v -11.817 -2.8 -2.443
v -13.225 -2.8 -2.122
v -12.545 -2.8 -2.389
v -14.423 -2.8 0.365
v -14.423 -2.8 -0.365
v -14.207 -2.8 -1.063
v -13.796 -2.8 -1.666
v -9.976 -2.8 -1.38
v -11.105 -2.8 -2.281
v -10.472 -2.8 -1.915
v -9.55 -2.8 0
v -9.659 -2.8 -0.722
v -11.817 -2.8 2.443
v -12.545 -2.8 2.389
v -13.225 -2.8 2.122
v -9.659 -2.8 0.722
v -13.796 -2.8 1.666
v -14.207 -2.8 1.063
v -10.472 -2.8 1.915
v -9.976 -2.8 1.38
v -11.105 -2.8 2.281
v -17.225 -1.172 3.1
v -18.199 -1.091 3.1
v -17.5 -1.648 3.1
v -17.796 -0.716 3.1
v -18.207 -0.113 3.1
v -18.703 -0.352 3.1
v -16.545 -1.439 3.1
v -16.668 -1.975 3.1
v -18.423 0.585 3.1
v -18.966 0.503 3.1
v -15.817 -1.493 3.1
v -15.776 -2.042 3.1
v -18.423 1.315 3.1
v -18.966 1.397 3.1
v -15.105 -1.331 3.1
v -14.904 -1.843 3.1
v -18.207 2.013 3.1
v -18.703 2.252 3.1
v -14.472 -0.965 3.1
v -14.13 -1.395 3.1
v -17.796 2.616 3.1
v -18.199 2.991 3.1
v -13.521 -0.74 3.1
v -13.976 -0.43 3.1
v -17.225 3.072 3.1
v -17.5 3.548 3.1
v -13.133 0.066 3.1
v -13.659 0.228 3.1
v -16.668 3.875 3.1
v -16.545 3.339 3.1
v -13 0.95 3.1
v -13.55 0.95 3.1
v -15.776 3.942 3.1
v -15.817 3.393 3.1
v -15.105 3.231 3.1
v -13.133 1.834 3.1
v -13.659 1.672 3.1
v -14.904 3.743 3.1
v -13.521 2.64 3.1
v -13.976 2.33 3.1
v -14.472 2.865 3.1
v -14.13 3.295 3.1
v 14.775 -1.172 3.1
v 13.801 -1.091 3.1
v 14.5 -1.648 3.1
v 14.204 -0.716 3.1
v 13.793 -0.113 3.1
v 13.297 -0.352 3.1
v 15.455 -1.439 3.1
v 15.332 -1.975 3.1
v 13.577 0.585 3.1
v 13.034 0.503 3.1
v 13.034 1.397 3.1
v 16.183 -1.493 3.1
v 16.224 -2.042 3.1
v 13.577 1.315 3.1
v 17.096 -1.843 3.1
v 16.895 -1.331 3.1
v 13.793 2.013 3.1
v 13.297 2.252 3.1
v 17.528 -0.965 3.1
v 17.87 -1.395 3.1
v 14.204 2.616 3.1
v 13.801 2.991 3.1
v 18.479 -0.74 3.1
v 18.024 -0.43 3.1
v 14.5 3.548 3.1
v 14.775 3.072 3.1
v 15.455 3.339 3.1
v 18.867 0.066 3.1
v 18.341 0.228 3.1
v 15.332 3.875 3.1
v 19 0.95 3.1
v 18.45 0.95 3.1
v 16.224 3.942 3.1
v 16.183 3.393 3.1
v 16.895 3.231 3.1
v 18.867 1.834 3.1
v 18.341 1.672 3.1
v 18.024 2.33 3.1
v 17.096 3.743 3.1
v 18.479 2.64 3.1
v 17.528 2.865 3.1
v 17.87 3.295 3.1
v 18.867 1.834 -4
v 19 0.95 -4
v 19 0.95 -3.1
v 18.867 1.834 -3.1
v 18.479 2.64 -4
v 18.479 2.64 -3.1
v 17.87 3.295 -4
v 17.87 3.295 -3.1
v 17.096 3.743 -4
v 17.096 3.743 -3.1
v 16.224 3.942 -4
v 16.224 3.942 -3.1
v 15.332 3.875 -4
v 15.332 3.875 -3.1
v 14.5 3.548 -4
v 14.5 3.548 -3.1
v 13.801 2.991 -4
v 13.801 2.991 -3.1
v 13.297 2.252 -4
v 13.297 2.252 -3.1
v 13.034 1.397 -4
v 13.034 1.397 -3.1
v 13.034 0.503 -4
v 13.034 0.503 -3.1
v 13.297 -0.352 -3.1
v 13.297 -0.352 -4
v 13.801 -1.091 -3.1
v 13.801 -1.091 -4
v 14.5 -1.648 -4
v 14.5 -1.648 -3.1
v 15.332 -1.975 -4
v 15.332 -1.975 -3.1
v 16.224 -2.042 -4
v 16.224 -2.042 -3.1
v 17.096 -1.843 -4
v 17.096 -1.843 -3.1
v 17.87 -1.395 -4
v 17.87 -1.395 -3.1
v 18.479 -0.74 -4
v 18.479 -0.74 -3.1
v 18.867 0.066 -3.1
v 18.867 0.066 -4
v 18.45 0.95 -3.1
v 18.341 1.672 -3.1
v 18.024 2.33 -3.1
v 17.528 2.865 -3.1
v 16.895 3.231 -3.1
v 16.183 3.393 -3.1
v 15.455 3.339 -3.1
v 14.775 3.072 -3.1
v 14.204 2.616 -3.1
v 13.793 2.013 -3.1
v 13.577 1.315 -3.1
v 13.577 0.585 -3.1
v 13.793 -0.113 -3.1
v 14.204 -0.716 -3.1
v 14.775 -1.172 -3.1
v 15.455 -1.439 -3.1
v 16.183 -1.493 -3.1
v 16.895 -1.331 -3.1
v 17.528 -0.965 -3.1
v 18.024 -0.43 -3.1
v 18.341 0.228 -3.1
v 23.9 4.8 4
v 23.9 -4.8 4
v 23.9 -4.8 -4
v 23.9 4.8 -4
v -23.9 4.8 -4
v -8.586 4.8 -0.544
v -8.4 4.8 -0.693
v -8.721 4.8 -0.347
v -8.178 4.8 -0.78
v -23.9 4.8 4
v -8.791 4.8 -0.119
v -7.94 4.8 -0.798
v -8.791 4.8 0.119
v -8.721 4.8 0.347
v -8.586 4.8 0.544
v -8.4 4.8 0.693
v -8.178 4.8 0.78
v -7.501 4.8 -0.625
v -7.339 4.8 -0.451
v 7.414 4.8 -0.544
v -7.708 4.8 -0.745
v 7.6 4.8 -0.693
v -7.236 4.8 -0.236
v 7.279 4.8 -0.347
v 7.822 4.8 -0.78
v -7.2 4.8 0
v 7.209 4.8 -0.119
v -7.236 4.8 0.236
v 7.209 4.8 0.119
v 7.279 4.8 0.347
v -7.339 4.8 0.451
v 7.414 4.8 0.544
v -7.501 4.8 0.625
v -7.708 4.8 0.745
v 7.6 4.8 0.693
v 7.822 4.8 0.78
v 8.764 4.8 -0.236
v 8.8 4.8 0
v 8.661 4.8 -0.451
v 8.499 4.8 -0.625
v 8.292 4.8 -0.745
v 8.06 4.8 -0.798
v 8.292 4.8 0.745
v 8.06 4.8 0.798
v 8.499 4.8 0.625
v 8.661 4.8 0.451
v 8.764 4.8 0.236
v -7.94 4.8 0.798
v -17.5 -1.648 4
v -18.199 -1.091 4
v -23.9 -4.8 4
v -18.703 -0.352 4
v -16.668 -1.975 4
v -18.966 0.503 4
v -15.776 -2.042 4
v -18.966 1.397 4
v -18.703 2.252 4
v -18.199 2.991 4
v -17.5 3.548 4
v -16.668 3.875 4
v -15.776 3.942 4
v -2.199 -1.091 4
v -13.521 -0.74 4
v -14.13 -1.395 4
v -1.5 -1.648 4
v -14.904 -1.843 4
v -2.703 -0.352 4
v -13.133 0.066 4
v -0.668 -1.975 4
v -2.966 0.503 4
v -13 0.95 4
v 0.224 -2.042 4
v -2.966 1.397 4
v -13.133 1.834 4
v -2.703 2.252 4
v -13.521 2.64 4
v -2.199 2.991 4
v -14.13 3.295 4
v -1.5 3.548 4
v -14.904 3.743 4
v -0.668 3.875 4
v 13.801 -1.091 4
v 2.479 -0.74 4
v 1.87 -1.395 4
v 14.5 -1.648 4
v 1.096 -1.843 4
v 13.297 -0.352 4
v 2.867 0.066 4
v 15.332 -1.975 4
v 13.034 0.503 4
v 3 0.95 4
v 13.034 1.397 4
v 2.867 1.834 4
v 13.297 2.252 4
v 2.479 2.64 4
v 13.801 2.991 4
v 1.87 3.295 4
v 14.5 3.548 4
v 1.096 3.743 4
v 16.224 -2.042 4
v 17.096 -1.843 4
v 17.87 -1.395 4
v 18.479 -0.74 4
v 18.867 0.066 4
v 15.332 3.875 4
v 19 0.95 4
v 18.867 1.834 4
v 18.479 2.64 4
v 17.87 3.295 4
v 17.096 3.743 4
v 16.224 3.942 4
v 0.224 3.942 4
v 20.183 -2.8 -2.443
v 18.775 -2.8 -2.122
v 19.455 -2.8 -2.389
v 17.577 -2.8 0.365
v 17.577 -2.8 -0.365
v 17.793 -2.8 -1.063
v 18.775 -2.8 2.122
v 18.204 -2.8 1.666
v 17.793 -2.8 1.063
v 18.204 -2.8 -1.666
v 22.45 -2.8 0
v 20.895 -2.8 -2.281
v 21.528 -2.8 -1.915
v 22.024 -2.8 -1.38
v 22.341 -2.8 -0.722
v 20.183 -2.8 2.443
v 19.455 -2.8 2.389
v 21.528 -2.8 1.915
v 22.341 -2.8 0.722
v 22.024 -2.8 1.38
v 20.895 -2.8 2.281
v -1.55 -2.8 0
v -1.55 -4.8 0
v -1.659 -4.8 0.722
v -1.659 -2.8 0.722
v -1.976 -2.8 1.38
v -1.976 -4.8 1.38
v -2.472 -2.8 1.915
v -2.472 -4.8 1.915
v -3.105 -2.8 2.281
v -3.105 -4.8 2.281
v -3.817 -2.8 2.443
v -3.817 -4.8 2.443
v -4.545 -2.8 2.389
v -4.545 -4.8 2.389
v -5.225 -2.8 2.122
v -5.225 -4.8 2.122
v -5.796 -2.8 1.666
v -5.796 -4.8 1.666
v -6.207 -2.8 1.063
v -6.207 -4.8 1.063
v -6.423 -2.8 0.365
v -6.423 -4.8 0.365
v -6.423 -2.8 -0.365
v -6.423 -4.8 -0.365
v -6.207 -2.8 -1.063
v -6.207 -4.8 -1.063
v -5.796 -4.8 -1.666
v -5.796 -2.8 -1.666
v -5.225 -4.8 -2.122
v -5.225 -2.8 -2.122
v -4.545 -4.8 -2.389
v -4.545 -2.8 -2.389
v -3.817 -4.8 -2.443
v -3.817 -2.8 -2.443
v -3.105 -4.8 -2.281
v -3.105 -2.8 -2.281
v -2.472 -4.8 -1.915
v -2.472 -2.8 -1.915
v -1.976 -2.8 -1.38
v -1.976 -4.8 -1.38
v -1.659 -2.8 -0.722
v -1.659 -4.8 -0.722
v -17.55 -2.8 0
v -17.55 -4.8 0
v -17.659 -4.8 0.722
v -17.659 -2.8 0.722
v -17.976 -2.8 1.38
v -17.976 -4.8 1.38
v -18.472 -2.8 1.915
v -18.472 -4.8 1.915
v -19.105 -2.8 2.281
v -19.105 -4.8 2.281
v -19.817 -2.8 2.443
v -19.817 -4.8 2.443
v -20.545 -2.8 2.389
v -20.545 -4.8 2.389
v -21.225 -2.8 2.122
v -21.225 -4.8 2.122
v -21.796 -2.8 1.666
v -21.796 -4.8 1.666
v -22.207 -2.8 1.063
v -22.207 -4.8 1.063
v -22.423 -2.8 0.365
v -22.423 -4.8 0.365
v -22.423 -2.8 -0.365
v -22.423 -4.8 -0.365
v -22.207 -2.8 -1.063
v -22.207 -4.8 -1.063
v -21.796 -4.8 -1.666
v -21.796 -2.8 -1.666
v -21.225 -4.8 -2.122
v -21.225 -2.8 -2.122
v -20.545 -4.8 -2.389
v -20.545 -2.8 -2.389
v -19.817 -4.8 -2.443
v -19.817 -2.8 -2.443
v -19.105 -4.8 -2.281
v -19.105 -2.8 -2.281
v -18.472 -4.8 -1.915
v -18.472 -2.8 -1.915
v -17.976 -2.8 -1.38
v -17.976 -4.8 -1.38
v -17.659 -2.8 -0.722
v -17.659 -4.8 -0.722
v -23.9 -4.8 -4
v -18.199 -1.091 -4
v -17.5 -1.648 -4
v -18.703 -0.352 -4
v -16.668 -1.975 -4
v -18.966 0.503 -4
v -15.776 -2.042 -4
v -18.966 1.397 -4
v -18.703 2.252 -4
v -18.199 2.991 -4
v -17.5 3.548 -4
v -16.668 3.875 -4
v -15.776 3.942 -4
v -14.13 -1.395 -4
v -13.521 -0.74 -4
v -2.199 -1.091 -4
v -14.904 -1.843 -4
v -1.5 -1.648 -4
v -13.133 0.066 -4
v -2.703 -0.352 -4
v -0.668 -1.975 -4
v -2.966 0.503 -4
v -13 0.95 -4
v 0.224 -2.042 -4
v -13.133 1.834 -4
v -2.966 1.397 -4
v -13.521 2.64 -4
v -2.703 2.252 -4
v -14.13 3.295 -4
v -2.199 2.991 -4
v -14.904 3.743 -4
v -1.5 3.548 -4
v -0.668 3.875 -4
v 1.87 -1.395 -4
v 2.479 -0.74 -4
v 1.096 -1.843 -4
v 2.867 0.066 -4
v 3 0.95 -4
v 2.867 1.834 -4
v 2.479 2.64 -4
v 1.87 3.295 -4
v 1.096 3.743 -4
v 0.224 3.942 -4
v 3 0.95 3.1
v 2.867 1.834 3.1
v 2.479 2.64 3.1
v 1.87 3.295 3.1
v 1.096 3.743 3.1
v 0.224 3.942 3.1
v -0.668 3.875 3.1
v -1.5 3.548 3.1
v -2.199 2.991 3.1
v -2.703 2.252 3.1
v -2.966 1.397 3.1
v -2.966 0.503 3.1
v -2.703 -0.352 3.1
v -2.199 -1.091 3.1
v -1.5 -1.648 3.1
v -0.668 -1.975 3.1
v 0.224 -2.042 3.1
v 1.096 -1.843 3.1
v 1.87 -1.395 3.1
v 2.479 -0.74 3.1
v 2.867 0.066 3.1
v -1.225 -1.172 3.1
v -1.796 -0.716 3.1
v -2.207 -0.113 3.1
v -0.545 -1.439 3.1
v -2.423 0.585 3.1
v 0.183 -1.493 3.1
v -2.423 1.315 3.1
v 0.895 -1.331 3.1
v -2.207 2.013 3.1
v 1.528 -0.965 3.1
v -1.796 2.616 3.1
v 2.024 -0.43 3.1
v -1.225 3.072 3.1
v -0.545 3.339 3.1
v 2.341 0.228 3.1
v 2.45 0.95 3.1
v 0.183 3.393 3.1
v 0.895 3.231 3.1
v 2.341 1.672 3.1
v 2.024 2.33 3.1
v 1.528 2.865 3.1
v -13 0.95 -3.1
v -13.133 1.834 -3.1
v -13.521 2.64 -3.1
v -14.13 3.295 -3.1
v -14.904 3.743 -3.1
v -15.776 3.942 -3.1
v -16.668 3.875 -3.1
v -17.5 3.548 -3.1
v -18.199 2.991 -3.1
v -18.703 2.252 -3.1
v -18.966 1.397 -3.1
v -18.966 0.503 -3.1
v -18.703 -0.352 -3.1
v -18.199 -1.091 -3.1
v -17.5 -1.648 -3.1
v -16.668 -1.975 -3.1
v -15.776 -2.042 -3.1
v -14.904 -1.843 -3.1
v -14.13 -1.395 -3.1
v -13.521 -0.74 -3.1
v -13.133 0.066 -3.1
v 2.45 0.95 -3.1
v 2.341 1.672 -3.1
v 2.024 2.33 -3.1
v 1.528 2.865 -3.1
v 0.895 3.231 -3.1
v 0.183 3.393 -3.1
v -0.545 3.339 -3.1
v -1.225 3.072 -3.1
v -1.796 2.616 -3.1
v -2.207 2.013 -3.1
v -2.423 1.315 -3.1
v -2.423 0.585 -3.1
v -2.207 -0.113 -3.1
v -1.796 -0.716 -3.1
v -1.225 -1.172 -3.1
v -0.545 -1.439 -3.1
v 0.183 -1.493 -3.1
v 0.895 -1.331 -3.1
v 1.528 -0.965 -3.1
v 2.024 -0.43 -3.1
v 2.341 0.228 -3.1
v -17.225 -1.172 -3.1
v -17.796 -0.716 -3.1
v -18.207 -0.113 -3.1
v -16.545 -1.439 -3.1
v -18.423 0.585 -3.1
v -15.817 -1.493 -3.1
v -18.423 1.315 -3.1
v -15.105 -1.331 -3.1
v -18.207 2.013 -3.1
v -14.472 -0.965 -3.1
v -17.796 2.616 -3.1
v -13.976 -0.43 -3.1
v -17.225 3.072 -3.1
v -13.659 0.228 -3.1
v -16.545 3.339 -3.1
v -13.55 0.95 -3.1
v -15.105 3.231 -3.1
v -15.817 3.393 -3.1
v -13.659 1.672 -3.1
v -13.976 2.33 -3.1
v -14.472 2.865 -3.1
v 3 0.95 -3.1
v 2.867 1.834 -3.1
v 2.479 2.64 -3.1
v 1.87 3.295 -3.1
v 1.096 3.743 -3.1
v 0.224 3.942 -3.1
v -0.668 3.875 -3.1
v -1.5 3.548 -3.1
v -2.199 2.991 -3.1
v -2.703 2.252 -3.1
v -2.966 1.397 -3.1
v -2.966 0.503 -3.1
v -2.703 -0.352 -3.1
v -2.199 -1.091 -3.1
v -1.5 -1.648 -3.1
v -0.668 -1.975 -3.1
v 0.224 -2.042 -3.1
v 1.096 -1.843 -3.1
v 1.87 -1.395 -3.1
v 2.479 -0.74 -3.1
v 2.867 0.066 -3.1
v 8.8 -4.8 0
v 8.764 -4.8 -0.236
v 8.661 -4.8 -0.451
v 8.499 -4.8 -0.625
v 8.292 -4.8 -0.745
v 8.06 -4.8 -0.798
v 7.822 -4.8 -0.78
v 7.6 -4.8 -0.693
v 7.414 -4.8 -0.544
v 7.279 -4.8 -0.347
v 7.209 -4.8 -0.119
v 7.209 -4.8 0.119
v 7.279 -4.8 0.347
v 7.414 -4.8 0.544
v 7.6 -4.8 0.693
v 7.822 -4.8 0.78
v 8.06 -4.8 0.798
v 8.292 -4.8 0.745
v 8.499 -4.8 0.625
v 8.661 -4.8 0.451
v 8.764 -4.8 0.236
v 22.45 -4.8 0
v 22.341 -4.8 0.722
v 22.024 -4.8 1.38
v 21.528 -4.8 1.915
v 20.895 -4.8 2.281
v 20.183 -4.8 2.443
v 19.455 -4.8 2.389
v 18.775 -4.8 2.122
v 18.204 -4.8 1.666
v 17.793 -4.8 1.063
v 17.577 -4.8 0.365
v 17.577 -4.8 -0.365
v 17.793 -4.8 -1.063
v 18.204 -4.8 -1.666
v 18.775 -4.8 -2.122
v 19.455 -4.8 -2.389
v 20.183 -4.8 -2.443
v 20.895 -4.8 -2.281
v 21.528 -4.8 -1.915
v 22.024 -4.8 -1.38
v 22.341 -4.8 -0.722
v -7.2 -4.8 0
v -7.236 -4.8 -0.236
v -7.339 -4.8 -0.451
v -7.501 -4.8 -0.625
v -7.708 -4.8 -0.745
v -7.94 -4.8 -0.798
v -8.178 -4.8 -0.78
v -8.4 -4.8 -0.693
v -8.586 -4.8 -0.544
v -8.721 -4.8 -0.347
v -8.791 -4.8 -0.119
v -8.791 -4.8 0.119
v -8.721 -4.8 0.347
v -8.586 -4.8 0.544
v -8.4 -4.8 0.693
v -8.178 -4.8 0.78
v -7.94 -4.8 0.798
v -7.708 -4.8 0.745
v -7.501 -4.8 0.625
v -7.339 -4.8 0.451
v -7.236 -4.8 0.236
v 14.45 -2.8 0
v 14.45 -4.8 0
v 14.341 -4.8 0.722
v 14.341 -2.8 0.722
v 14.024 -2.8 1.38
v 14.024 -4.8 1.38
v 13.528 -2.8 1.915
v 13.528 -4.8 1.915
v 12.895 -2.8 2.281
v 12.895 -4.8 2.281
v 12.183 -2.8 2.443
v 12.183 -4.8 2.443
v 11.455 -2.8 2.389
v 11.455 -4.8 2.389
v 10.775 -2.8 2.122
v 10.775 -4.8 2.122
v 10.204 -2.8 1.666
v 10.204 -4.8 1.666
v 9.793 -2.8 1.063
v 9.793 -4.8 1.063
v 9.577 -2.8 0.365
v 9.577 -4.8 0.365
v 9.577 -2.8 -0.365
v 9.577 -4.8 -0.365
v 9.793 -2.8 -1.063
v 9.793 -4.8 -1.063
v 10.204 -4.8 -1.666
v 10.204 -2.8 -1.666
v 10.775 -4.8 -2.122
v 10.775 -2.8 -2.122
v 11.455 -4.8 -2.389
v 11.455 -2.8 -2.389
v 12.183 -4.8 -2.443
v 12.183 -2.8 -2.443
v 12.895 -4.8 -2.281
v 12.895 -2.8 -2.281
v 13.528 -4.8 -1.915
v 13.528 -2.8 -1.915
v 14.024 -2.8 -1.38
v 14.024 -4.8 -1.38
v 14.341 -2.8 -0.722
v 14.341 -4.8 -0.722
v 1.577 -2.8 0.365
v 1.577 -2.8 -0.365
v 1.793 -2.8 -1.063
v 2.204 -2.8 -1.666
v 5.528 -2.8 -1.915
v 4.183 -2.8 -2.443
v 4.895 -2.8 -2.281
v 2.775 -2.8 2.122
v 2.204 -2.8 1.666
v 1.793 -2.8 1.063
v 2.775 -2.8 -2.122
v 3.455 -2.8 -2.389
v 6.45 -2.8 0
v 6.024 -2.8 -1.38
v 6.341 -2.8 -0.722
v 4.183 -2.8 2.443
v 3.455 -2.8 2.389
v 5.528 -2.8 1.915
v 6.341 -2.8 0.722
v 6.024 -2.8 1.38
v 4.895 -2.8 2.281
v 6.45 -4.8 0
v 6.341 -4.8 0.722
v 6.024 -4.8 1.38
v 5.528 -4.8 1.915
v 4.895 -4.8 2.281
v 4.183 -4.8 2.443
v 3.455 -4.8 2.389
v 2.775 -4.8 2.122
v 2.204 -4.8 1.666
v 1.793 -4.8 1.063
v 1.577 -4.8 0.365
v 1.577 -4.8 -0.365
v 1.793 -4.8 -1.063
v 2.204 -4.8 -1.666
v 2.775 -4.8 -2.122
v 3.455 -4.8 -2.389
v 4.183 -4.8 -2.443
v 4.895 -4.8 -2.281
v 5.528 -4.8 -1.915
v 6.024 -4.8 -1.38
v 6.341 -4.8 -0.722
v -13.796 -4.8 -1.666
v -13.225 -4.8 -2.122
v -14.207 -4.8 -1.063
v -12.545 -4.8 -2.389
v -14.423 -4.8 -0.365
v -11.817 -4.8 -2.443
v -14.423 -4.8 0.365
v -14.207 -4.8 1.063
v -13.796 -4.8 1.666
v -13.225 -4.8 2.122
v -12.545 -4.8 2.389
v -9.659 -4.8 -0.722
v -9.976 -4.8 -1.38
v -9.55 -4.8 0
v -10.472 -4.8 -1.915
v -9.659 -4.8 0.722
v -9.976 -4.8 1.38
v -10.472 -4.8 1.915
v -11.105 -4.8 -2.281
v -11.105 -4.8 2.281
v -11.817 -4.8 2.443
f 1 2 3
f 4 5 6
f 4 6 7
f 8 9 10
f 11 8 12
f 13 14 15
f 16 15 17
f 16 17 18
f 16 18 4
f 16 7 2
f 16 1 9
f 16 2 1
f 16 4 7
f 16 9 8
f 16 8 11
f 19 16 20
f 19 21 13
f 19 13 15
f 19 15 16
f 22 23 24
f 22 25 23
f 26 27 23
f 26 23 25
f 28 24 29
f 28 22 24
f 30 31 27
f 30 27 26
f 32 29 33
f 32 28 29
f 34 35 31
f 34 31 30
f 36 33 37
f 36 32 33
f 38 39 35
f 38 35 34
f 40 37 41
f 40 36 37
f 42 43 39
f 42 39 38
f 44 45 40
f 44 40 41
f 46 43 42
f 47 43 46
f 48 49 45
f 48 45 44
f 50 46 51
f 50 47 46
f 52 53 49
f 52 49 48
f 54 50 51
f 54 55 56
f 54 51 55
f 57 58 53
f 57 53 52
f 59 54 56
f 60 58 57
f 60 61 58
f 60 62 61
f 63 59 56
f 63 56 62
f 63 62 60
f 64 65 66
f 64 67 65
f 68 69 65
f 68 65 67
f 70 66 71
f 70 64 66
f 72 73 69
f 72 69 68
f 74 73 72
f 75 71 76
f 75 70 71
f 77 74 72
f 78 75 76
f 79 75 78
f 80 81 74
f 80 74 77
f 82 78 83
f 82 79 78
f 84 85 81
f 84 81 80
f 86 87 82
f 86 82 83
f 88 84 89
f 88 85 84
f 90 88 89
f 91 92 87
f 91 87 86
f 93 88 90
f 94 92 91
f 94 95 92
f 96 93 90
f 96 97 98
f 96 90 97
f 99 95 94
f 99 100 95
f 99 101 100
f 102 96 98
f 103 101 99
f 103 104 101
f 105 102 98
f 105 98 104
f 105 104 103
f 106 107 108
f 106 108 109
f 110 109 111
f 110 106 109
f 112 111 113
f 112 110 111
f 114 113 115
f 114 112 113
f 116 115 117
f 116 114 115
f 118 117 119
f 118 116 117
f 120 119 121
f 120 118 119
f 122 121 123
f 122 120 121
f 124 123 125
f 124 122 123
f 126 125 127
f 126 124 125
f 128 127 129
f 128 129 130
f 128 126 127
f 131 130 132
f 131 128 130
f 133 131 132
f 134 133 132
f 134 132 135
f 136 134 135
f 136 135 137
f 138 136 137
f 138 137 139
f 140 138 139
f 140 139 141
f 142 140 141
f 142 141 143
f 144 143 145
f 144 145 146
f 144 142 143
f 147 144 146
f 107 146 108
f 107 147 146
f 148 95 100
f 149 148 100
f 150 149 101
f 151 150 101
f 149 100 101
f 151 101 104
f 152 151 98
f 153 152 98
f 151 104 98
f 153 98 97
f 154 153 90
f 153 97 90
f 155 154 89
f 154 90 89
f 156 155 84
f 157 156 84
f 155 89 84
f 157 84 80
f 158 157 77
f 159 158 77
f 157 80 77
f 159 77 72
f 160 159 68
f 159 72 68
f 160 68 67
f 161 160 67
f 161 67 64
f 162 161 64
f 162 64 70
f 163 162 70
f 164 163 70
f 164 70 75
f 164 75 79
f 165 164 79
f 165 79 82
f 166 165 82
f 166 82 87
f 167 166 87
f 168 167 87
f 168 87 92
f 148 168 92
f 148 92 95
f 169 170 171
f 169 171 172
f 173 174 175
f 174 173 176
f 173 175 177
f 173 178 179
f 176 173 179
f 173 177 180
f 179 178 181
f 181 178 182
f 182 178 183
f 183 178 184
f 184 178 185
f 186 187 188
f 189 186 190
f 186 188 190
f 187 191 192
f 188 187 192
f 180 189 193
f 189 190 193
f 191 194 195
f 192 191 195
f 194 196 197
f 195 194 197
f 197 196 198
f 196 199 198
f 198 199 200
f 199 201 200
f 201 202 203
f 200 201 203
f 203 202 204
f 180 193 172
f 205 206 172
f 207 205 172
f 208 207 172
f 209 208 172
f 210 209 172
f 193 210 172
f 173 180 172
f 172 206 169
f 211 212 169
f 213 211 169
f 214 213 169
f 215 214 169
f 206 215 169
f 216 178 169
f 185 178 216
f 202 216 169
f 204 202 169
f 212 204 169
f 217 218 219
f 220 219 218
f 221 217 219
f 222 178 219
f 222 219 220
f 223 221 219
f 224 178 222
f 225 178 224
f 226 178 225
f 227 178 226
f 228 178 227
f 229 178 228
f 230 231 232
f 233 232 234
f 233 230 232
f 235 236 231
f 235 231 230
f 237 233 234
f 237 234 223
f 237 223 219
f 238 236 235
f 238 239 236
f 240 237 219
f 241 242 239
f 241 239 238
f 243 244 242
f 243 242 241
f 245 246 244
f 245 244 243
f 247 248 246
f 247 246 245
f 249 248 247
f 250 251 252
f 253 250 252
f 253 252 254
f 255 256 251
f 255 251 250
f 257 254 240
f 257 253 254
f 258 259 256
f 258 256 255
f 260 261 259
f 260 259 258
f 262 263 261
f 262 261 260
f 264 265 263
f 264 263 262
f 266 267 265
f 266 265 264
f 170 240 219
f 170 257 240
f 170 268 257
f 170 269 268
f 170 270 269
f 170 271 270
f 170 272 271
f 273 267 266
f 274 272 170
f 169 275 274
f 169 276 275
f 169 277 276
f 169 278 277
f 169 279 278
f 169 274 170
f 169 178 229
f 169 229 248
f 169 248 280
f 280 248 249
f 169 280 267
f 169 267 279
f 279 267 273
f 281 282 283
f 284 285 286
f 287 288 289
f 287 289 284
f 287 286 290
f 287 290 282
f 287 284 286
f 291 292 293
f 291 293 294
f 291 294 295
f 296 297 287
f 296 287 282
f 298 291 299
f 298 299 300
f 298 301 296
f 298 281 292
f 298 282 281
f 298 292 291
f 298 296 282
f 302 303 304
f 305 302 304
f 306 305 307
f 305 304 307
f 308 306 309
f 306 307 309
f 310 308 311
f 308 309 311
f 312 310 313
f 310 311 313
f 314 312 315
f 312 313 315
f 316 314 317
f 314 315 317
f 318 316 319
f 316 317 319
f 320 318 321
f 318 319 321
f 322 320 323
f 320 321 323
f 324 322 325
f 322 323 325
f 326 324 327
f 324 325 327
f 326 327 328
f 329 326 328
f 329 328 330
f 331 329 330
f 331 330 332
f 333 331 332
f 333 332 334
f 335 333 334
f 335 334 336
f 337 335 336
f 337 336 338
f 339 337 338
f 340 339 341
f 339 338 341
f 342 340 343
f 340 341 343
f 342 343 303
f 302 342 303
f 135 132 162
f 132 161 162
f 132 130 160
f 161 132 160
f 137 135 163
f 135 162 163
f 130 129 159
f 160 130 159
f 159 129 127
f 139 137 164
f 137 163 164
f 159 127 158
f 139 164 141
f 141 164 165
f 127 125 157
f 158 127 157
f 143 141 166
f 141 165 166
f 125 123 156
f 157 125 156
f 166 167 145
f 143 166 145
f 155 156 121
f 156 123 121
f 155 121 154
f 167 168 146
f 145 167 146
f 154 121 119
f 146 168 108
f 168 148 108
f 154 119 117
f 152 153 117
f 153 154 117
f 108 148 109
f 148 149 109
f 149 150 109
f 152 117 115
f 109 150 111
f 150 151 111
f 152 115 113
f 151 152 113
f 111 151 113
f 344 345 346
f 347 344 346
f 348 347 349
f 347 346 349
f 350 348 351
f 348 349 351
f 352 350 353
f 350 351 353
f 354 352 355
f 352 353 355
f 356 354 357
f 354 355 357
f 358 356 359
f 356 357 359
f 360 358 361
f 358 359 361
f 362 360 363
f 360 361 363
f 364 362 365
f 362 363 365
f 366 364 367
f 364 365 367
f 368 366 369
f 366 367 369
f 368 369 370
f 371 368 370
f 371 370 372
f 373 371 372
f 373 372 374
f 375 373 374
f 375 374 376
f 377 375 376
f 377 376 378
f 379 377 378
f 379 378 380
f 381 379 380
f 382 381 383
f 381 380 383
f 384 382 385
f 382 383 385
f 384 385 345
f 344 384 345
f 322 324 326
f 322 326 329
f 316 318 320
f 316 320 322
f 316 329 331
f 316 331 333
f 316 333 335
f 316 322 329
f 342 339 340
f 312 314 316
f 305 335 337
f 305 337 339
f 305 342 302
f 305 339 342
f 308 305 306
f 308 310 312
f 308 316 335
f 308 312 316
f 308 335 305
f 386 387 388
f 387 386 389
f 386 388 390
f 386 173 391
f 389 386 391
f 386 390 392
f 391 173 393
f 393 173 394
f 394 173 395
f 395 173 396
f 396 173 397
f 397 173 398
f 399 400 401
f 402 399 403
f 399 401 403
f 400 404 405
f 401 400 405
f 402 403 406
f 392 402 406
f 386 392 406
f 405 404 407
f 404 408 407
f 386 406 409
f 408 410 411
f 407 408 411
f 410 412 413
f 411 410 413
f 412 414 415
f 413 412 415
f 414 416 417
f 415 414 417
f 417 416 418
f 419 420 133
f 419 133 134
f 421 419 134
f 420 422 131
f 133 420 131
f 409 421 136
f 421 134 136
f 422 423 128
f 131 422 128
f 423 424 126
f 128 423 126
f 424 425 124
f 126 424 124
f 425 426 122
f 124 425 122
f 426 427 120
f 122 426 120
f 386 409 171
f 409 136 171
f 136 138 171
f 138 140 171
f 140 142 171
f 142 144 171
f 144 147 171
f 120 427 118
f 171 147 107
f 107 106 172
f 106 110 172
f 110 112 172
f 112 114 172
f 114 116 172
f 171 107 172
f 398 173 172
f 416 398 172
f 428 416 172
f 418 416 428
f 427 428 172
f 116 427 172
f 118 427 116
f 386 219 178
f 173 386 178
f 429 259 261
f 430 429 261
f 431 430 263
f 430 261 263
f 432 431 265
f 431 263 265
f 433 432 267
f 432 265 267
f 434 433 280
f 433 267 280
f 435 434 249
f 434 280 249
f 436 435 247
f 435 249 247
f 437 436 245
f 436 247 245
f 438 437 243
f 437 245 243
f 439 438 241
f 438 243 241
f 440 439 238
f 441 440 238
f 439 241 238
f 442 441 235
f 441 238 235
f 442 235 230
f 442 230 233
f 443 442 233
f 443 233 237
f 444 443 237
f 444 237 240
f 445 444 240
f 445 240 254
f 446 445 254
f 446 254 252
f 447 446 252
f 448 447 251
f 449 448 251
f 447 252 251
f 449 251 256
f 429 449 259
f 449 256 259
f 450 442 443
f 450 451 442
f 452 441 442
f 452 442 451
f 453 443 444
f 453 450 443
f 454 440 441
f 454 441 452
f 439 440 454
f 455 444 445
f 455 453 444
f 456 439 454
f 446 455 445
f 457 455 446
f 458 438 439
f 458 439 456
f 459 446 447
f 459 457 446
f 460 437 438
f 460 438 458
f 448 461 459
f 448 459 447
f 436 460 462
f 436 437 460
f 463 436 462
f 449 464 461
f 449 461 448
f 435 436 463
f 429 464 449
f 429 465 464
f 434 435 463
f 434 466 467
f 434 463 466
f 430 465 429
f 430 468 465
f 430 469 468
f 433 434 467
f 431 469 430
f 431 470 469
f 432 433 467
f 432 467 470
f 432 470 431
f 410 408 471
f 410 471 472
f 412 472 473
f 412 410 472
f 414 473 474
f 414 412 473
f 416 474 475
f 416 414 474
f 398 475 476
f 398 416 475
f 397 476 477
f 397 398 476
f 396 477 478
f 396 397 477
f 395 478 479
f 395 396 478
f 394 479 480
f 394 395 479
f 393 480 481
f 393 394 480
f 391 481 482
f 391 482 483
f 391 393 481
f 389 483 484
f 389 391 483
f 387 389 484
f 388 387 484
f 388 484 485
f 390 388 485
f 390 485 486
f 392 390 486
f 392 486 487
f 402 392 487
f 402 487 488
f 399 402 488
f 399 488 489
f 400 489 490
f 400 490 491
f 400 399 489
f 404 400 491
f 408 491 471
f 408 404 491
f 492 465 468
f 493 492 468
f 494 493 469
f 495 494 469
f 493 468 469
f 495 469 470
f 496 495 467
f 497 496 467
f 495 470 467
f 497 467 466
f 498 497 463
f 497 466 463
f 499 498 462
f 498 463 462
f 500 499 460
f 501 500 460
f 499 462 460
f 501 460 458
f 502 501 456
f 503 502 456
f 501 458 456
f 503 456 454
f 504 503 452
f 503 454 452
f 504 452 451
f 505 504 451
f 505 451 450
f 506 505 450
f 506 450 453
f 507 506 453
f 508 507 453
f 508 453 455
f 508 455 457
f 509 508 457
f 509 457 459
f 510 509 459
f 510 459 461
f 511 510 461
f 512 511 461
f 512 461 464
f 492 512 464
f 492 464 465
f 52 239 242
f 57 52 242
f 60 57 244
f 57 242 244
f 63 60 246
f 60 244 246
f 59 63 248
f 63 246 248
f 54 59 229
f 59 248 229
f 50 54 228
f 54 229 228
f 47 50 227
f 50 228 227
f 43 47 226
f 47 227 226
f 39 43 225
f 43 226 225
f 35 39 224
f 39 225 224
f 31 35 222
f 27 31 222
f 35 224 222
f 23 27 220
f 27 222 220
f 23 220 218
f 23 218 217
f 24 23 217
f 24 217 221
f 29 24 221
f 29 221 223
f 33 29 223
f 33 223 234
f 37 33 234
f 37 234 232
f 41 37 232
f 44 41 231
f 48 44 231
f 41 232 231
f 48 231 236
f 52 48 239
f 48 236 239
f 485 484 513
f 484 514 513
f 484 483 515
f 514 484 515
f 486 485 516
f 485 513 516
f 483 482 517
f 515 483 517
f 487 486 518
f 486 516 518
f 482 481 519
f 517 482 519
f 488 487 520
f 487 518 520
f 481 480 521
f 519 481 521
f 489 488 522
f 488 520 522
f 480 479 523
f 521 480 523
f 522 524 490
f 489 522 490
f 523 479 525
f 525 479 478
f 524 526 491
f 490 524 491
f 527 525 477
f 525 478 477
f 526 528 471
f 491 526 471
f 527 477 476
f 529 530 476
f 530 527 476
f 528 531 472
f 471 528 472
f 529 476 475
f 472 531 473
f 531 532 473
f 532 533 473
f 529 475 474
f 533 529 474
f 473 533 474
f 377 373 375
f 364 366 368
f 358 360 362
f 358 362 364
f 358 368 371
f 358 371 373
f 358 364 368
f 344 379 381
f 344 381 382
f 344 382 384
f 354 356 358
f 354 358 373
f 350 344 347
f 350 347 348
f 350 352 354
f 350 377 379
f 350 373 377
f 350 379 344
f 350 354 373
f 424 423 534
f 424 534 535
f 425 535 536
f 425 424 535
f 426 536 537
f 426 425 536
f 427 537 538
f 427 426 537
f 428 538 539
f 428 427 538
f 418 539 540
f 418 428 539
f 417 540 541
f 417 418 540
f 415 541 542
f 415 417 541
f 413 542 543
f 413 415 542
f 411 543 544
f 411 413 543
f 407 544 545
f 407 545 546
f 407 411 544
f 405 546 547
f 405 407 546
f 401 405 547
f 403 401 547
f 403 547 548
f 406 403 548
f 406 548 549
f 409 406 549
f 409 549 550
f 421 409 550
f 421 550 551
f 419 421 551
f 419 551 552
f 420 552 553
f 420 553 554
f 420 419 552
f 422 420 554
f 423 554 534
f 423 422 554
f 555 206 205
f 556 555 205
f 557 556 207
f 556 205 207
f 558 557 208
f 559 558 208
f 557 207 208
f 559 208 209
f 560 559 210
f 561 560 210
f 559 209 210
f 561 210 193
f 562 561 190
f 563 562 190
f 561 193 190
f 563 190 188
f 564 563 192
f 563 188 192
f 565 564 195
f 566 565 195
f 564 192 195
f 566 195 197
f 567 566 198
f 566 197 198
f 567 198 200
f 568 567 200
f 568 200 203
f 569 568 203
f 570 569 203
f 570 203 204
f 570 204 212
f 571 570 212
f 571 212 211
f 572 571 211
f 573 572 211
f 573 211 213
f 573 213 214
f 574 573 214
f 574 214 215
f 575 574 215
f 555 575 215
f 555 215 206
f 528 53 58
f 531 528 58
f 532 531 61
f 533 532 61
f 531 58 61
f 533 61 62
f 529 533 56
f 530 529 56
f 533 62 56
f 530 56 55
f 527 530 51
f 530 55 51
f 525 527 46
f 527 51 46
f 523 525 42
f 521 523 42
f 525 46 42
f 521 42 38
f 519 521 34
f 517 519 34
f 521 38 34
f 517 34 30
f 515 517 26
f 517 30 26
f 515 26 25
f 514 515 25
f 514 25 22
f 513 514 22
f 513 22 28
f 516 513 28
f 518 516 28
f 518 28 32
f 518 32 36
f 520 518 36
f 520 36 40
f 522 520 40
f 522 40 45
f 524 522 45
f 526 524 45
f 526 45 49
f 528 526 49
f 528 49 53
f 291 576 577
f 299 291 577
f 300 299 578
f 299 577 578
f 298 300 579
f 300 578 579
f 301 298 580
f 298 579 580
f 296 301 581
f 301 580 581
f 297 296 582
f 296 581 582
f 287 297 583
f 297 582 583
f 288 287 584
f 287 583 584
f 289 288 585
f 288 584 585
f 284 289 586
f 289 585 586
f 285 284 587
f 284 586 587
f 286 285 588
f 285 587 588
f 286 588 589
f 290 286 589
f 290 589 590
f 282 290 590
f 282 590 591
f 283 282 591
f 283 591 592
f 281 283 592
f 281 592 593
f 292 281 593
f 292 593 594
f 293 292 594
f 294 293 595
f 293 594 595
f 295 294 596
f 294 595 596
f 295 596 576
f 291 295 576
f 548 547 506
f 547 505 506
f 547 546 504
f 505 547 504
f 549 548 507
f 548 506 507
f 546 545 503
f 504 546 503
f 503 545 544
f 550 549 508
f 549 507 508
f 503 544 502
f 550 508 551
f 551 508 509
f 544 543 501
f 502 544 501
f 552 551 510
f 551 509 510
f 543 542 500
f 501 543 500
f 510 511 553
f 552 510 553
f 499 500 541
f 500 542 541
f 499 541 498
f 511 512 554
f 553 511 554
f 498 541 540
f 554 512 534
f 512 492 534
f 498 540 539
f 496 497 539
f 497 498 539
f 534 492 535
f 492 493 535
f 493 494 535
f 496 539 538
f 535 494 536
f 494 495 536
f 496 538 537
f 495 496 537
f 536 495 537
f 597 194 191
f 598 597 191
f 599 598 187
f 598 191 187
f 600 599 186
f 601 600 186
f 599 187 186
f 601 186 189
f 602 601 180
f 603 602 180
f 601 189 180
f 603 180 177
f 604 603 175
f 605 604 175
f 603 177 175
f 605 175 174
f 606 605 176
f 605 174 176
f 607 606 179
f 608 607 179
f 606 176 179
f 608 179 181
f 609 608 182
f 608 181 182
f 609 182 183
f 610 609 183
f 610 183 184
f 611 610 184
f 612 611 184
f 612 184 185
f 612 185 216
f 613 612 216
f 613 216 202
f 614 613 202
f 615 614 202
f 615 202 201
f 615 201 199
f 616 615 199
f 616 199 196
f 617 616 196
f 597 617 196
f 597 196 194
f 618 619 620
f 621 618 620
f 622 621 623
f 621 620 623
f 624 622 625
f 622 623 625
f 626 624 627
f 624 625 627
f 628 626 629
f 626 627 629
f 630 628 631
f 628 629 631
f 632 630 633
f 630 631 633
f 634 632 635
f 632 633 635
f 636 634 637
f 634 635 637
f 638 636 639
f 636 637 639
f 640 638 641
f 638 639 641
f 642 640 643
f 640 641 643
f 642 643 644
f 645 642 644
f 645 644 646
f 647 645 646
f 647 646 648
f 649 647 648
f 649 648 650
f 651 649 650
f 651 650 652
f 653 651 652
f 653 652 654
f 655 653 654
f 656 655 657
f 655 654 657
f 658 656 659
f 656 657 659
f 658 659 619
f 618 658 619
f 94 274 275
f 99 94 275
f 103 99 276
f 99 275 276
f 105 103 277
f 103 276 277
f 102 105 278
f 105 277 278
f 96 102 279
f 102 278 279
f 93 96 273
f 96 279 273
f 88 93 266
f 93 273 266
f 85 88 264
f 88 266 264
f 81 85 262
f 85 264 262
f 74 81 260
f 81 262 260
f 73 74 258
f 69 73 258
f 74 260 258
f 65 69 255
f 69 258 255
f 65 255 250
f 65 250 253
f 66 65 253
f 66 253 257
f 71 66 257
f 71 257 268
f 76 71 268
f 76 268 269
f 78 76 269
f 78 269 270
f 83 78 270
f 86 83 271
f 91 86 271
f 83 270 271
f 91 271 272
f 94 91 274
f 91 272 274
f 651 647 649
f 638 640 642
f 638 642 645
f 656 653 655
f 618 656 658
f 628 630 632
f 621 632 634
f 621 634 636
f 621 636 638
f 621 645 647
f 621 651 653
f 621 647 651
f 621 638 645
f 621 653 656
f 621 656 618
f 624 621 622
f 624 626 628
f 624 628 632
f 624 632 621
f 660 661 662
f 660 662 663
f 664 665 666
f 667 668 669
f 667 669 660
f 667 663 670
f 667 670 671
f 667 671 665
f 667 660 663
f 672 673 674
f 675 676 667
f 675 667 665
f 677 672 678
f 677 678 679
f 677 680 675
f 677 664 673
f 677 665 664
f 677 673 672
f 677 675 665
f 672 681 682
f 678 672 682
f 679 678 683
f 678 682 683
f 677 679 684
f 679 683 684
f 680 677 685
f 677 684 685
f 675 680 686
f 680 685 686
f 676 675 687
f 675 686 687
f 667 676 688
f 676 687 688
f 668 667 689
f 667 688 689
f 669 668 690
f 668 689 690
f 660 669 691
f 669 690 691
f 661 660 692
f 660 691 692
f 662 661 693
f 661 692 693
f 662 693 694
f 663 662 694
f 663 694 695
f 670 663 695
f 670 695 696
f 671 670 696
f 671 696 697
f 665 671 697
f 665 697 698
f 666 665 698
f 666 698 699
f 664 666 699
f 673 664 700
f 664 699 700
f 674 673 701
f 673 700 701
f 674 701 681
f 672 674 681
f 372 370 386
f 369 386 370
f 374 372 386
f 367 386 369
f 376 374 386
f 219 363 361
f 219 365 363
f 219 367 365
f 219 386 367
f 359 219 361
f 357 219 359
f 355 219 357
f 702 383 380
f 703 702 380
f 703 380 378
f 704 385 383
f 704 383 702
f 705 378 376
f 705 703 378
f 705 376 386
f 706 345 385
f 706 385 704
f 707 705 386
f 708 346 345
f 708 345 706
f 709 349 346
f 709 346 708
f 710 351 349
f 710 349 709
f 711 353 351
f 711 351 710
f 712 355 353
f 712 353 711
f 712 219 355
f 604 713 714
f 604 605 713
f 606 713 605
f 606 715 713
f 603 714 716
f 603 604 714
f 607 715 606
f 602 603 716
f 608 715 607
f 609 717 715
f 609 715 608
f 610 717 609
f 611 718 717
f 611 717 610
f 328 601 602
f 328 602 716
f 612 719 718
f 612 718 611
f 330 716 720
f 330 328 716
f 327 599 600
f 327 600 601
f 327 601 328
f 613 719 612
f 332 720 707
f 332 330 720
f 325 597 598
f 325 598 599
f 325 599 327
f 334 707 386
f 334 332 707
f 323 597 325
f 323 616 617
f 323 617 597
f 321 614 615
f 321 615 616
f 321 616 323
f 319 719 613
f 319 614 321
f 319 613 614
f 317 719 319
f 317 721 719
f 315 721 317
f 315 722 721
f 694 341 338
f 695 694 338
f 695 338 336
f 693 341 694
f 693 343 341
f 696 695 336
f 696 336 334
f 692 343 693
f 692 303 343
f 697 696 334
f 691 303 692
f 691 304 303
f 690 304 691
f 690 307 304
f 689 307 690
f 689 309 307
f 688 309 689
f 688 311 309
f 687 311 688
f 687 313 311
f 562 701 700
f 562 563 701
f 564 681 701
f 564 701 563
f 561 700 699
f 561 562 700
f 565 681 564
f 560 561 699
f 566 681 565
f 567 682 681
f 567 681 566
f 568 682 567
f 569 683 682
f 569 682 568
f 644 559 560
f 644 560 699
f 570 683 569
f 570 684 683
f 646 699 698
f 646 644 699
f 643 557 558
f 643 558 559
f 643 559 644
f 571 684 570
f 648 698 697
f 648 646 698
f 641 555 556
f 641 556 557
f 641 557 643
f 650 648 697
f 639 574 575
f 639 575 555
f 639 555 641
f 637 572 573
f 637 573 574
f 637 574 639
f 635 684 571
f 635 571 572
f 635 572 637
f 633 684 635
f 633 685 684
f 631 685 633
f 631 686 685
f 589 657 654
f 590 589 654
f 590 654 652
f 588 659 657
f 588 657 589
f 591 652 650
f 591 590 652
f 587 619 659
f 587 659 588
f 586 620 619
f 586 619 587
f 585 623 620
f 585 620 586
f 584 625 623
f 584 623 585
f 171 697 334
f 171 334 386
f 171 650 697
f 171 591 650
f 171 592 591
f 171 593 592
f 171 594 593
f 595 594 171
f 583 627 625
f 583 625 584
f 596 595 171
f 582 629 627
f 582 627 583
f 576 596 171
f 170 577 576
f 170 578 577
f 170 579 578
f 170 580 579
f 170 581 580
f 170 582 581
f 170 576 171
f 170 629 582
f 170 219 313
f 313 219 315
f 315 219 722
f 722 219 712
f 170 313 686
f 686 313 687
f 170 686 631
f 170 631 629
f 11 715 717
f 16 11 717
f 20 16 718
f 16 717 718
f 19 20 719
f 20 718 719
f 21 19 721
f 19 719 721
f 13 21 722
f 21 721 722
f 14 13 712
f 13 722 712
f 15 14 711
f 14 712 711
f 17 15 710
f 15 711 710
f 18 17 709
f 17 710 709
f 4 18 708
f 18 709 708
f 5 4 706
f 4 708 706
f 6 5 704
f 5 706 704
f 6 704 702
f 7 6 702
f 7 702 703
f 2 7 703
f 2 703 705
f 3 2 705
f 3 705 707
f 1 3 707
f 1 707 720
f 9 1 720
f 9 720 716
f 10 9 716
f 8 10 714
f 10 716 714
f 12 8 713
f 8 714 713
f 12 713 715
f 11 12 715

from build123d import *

# Parameters (mm, degrees)
SKIZZE1_W                       = 47.8
SKIZZE1_H                       = 9.6
AUFSATZ_LINEAR_AUSTRAGEN1_DEPTH = 4
SKIZZE2_R                       = 2.45
SCHNITT_LINEAR_AUSTRAGEN1_DEPTH = 26.656383221
SKIZZE2_3_R                     = 3
SKIZZE2_3_R_2                   = 2.45
SCHNITT_LINEAR_AUSTRAGEN2_DEPTH = 0.9
M2_GEWINDEBOHRUNG1_D            = 1.6
SKIZZE5_R                       = 2.45
SCHNITT_LINEAR_AUSTRAGEN3_DEPTH = 2


with BuildPart() as part:
    # Skizze1 → Aufsatz-Linear austragen1 (new, symmetric)
    with BuildSketch(Plane.XY):
        Rectangle(SKIZZE1_W, SKIZZE1_H)
    extrude(amount=AUFSATZ_LINEAR_AUSTRAGEN1_DEPTH, both=True)

    # Skizze2 → Schnitt-Linear austragen1 (cut, through all)
    with BuildSketch(Plane.XY.offset(4)):
        with Locations((-16, 0.95)):
            Circle(SKIZZE2_R)
        with Locations((0, 0.95)):
            Circle(SKIZZE2_R)
        with Locations((16, 0.95)):
            Circle(SKIZZE2_R)
    extrude(amount=-SCHNITT_LINEAR_AUSTRAGEN1_DEPTH, mode=Mode.SUBTRACT)

    # Skizze2<3> → Schnitt-Linear austragen2 (cut)
    # profile 1 of 3: a face of its own
    with BuildSketch(Plane.XY.offset(4)):
        with Locations((-16, 0.95)):
            Circle(SKIZZE2_3_R)
        with Locations((-16, 0.95)):
            Circle(SKIZZE2_3_R_2, mode=Mode.SUBTRACT)
    # profile 2 of 3: a face of its own
    with BuildSketch(Plane.XY.offset(4)):
        with Locations((0, 0.95)):
            Circle(SKIZZE2_3_R)
        with Locations((0, 0.95)):
            Circle(SKIZZE2_3_R_2, mode=Mode.SUBTRACT)
    # profile 3 of 3: a face of its own
    with BuildSketch(Plane.XY.offset(4)):
        with Locations((16, 0.95)):
            Circle(SKIZZE2_3_R)
        with Locations((16, 0.95)):
            Circle(SKIZZE2_3_R_2, mode=Mode.SUBTRACT)
    schnitt_linear_austragen2 = extrude(amount=-SCHNITT_LINEAR_AUSTRAGEN2_DEPTH, mode=Mode.SUBTRACT)

    # Spiegeln1: Schnitt-Linear austragen2 across plane
    add(schnitt_linear_austragen2.mirror(Plane.XY), mode=Mode.SUBTRACT)

    # M2 Gewindebohrung1 (through all)
    with Locations(Plane(origin=(0, -4.8, 0), x_dir=(-1, 0, 0), z_dir=(0, -1, 0))):
        with Locations((-8, 0), (8, 0)):
            Hole(M2_GEWINDEBOHRUNG1_D / 2)

    # Skizze5 → Schnitt-Linear austragen3 (cut)
    with BuildSketch(Plane.XZ.offset(4.8)):
        with Locations((-20, 0)):
            Circle(SKIZZE5_R)
        with Locations((-4, 0)):
            Circle(SKIZZE5_R)
        with Locations((-12, 0)):
            Circle(SKIZZE5_R)
        with Locations((4, 0)):
            Circle(SKIZZE5_R)
        with Locations((12, 0)):
            Circle(SKIZZE5_R)
        with Locations((20, 0)):
            Circle(SKIZZE5_R)
    extrude(amount=-SCHNITT_LINEAR_AUSTRAGEN3_DEPTH, mode=Mode.SUBTRACT)


solid = part.part
